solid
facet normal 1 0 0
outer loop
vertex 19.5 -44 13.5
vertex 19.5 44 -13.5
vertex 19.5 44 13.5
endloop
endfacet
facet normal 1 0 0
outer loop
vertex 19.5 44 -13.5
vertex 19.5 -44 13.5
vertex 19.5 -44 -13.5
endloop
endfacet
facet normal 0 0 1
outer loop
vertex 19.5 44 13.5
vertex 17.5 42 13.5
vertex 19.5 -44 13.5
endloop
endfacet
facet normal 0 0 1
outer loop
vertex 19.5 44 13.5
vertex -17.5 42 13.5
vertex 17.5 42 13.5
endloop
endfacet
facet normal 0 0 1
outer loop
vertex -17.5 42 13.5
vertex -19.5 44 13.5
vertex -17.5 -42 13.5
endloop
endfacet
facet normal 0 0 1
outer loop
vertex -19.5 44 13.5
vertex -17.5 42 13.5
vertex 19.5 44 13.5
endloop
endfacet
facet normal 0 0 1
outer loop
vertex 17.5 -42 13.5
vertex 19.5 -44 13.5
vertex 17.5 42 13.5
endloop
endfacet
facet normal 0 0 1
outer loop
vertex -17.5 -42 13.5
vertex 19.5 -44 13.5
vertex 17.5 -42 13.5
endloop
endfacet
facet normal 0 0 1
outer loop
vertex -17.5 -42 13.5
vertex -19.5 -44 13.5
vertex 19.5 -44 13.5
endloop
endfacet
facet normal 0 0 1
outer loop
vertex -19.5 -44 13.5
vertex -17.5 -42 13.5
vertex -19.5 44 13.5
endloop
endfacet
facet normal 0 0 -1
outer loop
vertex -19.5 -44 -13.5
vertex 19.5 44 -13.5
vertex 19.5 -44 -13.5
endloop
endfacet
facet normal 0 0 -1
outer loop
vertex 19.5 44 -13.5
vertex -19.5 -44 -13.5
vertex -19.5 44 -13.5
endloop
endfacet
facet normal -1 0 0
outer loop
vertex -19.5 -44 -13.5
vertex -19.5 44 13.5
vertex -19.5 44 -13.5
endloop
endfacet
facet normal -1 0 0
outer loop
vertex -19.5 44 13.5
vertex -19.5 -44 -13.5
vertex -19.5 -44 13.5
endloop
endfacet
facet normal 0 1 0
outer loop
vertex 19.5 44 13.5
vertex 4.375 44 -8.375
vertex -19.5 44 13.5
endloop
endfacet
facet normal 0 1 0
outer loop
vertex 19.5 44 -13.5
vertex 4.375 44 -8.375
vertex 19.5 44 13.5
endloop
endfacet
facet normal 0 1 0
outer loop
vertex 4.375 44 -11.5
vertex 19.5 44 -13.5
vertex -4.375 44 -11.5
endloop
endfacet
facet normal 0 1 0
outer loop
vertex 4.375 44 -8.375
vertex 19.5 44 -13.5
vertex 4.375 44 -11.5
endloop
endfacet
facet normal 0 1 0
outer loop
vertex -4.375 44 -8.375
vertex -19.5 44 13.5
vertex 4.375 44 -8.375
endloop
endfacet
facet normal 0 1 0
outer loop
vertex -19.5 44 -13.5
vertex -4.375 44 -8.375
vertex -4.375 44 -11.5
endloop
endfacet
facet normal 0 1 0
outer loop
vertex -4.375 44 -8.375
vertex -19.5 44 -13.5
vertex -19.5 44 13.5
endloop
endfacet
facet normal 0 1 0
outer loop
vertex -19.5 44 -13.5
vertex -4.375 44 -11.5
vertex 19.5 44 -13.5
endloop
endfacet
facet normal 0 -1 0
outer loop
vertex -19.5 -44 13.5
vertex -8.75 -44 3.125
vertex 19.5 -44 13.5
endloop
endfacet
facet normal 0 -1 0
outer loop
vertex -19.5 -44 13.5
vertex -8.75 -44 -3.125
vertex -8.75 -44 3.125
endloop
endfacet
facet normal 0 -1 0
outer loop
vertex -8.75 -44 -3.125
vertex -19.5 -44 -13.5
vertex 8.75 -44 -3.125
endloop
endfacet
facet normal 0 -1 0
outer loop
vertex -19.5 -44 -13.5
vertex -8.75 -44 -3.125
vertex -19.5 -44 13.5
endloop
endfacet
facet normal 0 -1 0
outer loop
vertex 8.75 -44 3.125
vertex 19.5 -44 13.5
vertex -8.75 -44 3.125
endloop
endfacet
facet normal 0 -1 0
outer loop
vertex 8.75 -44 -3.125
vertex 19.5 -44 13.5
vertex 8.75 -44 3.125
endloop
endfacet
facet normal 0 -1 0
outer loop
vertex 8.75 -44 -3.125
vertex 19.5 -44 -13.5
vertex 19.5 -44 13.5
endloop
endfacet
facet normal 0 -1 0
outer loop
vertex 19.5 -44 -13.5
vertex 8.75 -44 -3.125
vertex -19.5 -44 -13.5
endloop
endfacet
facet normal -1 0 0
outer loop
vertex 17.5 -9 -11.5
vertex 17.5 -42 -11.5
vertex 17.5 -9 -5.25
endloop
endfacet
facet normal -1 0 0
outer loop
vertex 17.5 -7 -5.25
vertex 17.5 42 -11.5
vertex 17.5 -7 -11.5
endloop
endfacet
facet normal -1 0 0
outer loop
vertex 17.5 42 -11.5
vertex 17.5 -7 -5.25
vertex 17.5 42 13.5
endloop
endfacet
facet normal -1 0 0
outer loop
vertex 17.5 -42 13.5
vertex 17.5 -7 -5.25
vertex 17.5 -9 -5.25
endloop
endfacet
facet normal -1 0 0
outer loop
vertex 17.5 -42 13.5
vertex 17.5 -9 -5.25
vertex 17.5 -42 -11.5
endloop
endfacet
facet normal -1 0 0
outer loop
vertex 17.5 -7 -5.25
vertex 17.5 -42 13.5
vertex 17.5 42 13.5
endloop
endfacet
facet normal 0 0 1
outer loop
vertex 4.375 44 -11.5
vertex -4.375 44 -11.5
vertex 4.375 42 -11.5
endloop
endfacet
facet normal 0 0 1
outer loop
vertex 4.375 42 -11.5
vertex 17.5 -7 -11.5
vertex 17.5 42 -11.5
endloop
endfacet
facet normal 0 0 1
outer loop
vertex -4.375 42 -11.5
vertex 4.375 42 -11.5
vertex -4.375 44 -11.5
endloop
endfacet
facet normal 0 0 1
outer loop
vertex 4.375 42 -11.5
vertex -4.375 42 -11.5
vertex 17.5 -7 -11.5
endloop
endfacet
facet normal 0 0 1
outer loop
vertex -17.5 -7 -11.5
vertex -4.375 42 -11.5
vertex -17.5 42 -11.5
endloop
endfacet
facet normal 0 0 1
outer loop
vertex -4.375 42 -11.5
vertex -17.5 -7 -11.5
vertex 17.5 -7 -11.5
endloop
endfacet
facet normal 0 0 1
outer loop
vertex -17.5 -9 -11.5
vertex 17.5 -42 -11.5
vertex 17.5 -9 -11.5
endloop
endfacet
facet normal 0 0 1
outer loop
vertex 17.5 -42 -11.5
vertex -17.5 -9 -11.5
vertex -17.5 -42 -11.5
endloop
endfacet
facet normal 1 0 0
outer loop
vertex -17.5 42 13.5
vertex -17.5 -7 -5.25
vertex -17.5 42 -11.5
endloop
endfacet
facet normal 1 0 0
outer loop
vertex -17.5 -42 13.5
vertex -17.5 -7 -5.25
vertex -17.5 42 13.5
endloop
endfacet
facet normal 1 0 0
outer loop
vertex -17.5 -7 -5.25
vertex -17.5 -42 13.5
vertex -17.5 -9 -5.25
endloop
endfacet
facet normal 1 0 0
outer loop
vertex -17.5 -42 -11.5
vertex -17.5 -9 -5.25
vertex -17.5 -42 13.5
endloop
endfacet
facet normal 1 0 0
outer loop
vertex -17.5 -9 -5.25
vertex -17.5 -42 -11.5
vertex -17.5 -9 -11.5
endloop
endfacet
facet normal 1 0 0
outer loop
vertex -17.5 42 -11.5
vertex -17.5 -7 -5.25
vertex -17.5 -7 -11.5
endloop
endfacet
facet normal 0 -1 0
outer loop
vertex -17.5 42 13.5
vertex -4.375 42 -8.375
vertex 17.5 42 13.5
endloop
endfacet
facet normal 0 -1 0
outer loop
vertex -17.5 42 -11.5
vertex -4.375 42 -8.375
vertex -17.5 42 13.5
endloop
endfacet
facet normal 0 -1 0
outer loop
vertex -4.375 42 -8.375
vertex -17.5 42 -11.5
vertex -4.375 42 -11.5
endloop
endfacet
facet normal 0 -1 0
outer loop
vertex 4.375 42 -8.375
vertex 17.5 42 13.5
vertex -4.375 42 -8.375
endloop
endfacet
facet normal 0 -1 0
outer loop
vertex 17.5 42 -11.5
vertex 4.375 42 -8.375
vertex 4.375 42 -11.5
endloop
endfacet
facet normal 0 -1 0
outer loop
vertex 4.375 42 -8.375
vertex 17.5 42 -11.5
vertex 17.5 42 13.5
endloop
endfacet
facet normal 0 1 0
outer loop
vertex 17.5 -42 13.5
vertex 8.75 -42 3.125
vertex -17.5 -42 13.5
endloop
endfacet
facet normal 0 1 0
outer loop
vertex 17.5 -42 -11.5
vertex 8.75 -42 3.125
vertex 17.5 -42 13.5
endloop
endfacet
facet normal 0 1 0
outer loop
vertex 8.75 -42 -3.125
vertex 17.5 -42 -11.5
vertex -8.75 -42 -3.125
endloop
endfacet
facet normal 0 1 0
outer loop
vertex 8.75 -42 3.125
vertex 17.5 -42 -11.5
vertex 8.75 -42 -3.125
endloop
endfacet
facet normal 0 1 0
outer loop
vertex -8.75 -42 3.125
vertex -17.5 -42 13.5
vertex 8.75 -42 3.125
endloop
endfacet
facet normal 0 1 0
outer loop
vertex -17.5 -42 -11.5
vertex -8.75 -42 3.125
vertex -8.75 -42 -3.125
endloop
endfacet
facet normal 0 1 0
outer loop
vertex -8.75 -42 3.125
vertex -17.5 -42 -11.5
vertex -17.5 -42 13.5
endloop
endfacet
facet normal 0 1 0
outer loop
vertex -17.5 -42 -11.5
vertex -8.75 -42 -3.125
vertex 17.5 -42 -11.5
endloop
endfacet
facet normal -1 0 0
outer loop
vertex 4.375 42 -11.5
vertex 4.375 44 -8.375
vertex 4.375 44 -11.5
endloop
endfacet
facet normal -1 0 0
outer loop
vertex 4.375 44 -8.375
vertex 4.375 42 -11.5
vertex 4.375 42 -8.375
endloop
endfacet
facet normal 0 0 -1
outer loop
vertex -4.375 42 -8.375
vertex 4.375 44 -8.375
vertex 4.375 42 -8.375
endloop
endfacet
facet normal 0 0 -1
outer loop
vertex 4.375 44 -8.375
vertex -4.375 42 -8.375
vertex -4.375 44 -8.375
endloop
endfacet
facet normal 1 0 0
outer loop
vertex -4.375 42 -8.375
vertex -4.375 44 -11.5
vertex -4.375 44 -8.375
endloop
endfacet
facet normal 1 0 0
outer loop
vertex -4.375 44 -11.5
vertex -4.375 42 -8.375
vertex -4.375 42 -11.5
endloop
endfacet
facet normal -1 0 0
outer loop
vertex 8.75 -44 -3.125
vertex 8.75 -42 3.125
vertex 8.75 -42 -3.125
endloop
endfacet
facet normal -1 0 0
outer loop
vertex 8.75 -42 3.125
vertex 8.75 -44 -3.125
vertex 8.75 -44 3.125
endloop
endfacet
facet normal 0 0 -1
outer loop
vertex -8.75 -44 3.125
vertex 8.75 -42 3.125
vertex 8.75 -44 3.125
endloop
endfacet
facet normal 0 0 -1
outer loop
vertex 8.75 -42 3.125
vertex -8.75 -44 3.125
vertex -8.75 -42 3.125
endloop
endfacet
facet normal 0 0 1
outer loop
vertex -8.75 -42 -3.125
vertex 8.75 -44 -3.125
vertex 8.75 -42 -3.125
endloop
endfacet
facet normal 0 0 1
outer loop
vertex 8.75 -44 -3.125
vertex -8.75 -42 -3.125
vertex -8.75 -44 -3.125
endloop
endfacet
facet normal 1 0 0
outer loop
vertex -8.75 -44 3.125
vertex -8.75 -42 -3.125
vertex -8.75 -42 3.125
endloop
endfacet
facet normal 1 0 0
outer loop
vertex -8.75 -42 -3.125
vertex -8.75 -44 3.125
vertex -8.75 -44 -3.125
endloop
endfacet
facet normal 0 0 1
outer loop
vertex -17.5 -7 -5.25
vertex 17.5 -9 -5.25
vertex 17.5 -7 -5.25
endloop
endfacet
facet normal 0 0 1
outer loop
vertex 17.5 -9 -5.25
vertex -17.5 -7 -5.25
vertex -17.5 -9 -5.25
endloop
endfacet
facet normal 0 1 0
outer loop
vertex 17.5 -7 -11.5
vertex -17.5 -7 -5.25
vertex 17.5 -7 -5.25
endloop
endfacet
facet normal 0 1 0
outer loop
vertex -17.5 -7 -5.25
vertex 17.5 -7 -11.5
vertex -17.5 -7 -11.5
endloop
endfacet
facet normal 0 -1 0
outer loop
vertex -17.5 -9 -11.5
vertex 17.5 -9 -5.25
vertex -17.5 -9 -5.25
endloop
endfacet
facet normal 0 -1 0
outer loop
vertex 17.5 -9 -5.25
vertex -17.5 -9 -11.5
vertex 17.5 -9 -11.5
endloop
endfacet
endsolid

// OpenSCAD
esp8266Height = 48;
uln2003Height = 34;
wallThickness = 2;

insideWidth = 35;
insideHeight = 82 + /* Divider */ wallThickness;
insideDepth = 25;


caseWidth = insideWidth + (wallThickness * 2);
caseHeight = insideHeight + (wallThickness * 2);
caseDepth = insideDepth + wallThickness;



difference() {
    cube([caseWidth, caseHeight, caseDepth], center = true);
    translate([0, 0, wallThickness / 2]) {
        cube([insideWidth, insideHeight, insideDepth], center = true);
    };
    
    // Port #1 (USB)
    portOneWidth = insideWidth / 4;
    portOneDepth = insideDepth / 8;
    
    translate([0, caseHeight / 2, -(caseDepth / 2) + (portOneDepth / 2) + wallThickness]) {
        cube([portOneWidth, insideHeight / 2, portOneDepth], center = true);
    }
    
    // Port #2 (JST)
    portTwoWidth = insideWidth / 2;
    portTwoDepth = insideDepth / 4;
    
    translate([0, -(insideHeight / 2), 0]) {
        cube([portTwoWidth, insideHeight / 2, portTwoDepth], center = true);
    }
}

// Divider
dividerDepth = insideDepth / 4;

translate([0, -((insideHeight / 2) - uln2003Height), -(caseDepth / 2) + (dividerDepth / 2) + wallThickness]) {
    cube([insideWidth, wallThickness, dividerDepth], center = true);
}
